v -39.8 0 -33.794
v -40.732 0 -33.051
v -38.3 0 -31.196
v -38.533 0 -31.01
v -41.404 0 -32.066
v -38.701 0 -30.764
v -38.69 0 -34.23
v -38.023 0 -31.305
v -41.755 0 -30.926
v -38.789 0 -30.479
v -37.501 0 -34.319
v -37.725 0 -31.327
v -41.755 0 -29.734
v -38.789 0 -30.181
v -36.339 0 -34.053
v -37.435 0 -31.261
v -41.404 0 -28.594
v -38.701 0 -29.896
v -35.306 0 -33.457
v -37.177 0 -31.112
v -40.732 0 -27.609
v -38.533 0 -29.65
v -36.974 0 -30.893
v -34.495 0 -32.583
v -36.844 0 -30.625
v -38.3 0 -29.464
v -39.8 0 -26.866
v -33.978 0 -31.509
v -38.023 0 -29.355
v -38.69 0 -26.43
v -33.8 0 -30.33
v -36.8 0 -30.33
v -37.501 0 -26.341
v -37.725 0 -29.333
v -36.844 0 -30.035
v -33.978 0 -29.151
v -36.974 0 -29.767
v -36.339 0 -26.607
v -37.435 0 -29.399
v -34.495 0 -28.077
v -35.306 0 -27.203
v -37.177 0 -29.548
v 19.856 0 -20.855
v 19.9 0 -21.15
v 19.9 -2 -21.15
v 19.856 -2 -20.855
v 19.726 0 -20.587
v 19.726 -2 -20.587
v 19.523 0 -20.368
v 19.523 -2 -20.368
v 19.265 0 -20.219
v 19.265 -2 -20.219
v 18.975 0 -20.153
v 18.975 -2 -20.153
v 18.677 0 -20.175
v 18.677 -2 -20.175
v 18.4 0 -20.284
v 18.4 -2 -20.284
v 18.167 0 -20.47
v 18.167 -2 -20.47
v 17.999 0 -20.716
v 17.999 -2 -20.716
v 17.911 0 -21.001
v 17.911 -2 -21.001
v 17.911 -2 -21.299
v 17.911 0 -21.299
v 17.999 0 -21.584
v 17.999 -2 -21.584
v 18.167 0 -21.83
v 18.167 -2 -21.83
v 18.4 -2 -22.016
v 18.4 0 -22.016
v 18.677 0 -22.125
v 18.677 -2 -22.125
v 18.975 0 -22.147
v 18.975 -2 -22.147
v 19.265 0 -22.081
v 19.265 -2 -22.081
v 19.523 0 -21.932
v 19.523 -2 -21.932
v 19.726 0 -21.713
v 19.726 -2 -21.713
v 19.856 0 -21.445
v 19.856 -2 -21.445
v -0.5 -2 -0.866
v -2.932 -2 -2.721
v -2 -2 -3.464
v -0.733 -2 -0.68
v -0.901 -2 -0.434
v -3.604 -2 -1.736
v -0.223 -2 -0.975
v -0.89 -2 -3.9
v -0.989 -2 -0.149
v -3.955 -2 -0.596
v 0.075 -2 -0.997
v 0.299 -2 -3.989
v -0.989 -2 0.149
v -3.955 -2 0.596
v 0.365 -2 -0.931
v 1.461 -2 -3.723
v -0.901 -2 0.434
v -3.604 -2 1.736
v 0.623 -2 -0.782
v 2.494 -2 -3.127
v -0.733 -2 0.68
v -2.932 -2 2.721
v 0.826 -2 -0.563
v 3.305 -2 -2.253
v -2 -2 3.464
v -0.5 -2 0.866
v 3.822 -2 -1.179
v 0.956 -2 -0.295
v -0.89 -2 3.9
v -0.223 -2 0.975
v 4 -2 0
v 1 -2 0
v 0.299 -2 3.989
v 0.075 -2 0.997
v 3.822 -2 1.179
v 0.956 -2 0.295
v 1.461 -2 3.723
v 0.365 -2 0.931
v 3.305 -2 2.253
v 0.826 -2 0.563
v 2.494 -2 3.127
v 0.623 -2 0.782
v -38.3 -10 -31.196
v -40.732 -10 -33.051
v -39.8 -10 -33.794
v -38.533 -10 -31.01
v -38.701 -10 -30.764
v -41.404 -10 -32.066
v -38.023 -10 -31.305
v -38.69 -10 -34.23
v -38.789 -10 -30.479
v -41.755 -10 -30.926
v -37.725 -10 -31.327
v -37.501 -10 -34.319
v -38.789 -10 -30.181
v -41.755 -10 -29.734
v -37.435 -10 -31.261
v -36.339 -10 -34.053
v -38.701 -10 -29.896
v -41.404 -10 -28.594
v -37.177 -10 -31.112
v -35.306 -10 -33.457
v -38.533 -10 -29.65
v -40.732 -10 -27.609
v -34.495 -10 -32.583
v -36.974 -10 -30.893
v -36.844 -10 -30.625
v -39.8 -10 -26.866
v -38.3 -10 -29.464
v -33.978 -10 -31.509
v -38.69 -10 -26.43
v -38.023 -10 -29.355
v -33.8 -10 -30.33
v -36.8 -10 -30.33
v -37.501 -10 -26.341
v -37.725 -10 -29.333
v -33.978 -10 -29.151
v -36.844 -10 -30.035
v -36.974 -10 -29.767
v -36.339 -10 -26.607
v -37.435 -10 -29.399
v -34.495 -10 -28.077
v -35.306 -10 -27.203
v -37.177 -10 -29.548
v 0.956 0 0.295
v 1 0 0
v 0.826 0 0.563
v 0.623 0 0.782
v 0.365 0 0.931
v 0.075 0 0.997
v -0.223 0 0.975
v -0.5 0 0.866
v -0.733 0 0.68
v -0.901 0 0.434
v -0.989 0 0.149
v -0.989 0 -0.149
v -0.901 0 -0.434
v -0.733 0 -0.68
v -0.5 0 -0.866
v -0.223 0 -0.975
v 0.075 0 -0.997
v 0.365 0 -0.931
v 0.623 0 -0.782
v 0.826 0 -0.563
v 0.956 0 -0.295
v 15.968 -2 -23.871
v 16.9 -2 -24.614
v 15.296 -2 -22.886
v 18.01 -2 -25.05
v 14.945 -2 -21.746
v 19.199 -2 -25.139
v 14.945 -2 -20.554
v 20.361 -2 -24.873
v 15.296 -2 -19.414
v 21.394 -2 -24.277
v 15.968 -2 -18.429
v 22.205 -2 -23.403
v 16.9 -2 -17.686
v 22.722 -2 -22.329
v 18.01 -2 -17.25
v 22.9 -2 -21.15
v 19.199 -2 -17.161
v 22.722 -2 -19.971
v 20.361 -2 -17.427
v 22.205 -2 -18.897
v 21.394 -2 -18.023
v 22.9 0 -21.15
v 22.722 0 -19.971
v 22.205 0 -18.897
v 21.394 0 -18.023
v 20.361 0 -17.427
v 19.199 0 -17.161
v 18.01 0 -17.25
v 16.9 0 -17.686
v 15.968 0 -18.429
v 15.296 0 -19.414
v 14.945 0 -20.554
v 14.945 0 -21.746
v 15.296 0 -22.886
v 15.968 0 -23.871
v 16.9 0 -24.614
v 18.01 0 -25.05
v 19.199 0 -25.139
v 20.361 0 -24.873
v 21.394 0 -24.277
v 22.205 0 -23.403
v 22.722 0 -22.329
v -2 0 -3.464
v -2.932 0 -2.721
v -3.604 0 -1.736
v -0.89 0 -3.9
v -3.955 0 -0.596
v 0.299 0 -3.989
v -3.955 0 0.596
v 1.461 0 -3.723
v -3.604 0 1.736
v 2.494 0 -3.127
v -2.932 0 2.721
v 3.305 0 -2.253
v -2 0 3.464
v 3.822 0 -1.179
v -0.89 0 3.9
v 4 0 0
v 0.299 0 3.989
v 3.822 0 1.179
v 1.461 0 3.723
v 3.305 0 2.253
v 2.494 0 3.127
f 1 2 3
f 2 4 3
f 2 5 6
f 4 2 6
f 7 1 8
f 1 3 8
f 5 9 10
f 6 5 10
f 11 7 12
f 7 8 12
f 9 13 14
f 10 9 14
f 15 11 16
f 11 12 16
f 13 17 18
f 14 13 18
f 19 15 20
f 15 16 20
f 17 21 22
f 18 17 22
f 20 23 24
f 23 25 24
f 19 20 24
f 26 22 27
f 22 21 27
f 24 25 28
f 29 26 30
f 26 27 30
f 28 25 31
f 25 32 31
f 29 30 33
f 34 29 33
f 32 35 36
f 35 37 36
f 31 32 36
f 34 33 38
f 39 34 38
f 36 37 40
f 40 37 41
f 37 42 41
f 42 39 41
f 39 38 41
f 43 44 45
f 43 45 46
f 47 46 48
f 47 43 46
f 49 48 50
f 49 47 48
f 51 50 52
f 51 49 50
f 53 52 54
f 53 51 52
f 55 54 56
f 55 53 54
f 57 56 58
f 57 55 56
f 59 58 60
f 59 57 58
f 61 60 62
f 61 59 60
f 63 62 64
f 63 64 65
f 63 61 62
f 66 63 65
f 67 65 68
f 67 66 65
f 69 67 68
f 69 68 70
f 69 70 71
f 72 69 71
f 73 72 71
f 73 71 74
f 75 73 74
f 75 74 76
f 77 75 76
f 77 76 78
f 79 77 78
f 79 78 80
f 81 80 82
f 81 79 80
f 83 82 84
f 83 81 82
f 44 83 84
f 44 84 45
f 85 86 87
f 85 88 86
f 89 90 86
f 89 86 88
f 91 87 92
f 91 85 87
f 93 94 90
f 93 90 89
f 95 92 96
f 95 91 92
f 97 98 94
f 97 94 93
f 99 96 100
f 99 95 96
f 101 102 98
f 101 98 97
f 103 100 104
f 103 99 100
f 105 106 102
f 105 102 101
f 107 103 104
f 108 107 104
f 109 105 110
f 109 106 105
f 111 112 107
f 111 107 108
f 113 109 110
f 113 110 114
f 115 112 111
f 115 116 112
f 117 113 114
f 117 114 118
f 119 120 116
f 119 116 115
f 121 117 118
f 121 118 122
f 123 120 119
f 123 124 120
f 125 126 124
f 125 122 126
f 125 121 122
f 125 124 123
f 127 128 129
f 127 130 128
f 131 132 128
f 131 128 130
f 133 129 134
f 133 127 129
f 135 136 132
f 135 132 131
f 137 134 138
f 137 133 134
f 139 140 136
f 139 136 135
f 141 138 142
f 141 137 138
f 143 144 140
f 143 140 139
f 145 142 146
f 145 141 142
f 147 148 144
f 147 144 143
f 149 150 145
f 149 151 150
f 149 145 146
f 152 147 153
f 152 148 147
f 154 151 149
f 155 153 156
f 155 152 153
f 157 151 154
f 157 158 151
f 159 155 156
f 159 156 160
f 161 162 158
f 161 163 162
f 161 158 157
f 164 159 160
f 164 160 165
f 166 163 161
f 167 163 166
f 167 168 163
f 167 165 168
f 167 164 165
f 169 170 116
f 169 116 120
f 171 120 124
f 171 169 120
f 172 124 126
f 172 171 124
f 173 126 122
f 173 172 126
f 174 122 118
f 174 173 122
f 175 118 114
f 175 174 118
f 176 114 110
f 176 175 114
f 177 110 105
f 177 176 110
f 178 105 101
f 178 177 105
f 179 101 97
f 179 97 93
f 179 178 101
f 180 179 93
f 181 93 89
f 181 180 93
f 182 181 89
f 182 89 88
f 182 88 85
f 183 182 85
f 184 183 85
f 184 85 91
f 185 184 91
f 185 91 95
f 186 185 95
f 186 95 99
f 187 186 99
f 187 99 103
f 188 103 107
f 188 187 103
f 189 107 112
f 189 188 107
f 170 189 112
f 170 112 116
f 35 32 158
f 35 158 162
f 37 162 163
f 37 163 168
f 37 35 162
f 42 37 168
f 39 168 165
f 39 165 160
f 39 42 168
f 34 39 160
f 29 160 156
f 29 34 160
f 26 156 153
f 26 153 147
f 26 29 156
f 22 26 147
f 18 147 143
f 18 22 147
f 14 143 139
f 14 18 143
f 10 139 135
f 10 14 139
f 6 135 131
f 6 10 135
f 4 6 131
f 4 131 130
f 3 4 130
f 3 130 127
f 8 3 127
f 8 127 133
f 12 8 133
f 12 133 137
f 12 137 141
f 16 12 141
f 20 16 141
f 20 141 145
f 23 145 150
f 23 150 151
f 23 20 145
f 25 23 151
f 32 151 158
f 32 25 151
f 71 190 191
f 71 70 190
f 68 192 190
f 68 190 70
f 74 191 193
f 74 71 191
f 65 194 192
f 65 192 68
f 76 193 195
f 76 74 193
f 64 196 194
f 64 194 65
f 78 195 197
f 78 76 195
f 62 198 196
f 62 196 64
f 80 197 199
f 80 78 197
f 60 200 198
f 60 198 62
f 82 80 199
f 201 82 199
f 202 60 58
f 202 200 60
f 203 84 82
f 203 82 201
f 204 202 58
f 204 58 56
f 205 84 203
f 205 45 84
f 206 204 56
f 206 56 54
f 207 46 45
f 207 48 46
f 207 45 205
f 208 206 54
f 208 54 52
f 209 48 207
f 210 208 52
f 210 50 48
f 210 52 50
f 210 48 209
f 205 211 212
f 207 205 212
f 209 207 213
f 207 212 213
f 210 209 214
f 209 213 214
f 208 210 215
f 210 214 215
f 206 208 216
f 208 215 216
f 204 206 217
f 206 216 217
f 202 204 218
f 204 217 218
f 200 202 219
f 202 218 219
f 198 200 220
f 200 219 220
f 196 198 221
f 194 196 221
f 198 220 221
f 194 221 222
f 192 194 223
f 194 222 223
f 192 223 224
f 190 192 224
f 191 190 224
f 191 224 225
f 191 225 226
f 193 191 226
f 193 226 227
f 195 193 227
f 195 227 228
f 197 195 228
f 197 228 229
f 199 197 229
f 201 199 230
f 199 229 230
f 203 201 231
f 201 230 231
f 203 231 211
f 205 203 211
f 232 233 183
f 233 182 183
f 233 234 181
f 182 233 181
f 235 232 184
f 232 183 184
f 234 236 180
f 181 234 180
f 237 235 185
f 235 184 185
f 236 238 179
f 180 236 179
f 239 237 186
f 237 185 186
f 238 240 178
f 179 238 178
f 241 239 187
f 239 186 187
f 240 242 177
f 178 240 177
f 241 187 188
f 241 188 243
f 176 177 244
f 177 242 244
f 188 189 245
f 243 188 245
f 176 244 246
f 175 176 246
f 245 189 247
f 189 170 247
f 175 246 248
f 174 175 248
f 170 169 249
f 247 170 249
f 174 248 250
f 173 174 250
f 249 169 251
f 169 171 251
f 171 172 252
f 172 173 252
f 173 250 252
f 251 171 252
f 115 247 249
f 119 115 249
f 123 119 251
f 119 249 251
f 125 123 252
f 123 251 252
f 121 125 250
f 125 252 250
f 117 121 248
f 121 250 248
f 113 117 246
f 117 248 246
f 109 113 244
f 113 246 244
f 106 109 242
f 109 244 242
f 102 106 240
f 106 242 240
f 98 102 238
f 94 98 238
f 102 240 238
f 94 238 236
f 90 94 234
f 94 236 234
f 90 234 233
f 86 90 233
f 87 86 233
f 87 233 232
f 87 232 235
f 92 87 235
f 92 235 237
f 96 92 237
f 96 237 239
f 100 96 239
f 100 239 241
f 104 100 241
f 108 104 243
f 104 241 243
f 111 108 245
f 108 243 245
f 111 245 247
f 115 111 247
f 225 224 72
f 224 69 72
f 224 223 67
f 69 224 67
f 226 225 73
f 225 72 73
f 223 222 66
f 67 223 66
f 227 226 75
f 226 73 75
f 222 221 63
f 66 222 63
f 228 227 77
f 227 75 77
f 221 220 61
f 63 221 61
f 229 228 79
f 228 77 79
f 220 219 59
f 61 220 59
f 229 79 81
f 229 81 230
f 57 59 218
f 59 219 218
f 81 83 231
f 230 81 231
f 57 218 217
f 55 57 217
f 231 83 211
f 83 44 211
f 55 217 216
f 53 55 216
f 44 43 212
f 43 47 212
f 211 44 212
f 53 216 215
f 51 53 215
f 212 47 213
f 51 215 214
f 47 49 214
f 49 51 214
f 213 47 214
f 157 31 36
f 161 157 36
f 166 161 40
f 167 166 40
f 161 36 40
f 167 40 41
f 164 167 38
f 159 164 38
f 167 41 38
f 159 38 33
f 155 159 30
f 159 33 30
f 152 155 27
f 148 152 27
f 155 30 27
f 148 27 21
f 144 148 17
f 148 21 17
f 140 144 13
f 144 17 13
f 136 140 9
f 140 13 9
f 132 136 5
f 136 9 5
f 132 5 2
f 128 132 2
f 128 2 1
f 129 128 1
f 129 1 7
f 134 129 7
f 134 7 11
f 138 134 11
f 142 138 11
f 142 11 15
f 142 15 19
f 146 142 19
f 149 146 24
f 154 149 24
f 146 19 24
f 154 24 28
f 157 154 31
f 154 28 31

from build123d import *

# Parameters (mm, degrees)
F0_R     = 4
F0_R_2   = 1
F1_DEPTH = 2
F2_R     = 4
F2_R_2   = 1
F3_DEPTH = 10
F4_R     = 4
F4_R_2   = 1
F5_DEPTH = 2


with BuildPart() as f1:
    # F0 (on Front) → F1 (new body)
    with BuildSketch(Plane.XZ):
        Circle(F0_R)
        Circle(F0_R_2, mode=Mode.SUBTRACT)
    extrude(amount=F1_DEPTH)


with BuildPart() as f3:
    # F2 (on Front) → F3 (new body)
    with BuildSketch(Plane.XZ):
        with Locations((-37.800003, -30.330002)):
            Circle(F2_R)
        with Locations((-37.800003, -30.330002)):
            Circle(F2_R_2, mode=Mode.SUBTRACT)
    extrude(amount=F3_DEPTH)


with BuildPart() as f5:
    # F4 (on Front) → F5 (new body)
    with BuildSketch(Plane.XZ):
        with Locations((18.900001, -21.150002)):
            Circle(F4_R)
        with Locations((18.900001, -21.150002)):
            Circle(F4_R_2, mode=Mode.SUBTRACT)
    extrude(amount=F5_DEPTH)


solid = Compound([f1.part, f3.part, f5.part])
